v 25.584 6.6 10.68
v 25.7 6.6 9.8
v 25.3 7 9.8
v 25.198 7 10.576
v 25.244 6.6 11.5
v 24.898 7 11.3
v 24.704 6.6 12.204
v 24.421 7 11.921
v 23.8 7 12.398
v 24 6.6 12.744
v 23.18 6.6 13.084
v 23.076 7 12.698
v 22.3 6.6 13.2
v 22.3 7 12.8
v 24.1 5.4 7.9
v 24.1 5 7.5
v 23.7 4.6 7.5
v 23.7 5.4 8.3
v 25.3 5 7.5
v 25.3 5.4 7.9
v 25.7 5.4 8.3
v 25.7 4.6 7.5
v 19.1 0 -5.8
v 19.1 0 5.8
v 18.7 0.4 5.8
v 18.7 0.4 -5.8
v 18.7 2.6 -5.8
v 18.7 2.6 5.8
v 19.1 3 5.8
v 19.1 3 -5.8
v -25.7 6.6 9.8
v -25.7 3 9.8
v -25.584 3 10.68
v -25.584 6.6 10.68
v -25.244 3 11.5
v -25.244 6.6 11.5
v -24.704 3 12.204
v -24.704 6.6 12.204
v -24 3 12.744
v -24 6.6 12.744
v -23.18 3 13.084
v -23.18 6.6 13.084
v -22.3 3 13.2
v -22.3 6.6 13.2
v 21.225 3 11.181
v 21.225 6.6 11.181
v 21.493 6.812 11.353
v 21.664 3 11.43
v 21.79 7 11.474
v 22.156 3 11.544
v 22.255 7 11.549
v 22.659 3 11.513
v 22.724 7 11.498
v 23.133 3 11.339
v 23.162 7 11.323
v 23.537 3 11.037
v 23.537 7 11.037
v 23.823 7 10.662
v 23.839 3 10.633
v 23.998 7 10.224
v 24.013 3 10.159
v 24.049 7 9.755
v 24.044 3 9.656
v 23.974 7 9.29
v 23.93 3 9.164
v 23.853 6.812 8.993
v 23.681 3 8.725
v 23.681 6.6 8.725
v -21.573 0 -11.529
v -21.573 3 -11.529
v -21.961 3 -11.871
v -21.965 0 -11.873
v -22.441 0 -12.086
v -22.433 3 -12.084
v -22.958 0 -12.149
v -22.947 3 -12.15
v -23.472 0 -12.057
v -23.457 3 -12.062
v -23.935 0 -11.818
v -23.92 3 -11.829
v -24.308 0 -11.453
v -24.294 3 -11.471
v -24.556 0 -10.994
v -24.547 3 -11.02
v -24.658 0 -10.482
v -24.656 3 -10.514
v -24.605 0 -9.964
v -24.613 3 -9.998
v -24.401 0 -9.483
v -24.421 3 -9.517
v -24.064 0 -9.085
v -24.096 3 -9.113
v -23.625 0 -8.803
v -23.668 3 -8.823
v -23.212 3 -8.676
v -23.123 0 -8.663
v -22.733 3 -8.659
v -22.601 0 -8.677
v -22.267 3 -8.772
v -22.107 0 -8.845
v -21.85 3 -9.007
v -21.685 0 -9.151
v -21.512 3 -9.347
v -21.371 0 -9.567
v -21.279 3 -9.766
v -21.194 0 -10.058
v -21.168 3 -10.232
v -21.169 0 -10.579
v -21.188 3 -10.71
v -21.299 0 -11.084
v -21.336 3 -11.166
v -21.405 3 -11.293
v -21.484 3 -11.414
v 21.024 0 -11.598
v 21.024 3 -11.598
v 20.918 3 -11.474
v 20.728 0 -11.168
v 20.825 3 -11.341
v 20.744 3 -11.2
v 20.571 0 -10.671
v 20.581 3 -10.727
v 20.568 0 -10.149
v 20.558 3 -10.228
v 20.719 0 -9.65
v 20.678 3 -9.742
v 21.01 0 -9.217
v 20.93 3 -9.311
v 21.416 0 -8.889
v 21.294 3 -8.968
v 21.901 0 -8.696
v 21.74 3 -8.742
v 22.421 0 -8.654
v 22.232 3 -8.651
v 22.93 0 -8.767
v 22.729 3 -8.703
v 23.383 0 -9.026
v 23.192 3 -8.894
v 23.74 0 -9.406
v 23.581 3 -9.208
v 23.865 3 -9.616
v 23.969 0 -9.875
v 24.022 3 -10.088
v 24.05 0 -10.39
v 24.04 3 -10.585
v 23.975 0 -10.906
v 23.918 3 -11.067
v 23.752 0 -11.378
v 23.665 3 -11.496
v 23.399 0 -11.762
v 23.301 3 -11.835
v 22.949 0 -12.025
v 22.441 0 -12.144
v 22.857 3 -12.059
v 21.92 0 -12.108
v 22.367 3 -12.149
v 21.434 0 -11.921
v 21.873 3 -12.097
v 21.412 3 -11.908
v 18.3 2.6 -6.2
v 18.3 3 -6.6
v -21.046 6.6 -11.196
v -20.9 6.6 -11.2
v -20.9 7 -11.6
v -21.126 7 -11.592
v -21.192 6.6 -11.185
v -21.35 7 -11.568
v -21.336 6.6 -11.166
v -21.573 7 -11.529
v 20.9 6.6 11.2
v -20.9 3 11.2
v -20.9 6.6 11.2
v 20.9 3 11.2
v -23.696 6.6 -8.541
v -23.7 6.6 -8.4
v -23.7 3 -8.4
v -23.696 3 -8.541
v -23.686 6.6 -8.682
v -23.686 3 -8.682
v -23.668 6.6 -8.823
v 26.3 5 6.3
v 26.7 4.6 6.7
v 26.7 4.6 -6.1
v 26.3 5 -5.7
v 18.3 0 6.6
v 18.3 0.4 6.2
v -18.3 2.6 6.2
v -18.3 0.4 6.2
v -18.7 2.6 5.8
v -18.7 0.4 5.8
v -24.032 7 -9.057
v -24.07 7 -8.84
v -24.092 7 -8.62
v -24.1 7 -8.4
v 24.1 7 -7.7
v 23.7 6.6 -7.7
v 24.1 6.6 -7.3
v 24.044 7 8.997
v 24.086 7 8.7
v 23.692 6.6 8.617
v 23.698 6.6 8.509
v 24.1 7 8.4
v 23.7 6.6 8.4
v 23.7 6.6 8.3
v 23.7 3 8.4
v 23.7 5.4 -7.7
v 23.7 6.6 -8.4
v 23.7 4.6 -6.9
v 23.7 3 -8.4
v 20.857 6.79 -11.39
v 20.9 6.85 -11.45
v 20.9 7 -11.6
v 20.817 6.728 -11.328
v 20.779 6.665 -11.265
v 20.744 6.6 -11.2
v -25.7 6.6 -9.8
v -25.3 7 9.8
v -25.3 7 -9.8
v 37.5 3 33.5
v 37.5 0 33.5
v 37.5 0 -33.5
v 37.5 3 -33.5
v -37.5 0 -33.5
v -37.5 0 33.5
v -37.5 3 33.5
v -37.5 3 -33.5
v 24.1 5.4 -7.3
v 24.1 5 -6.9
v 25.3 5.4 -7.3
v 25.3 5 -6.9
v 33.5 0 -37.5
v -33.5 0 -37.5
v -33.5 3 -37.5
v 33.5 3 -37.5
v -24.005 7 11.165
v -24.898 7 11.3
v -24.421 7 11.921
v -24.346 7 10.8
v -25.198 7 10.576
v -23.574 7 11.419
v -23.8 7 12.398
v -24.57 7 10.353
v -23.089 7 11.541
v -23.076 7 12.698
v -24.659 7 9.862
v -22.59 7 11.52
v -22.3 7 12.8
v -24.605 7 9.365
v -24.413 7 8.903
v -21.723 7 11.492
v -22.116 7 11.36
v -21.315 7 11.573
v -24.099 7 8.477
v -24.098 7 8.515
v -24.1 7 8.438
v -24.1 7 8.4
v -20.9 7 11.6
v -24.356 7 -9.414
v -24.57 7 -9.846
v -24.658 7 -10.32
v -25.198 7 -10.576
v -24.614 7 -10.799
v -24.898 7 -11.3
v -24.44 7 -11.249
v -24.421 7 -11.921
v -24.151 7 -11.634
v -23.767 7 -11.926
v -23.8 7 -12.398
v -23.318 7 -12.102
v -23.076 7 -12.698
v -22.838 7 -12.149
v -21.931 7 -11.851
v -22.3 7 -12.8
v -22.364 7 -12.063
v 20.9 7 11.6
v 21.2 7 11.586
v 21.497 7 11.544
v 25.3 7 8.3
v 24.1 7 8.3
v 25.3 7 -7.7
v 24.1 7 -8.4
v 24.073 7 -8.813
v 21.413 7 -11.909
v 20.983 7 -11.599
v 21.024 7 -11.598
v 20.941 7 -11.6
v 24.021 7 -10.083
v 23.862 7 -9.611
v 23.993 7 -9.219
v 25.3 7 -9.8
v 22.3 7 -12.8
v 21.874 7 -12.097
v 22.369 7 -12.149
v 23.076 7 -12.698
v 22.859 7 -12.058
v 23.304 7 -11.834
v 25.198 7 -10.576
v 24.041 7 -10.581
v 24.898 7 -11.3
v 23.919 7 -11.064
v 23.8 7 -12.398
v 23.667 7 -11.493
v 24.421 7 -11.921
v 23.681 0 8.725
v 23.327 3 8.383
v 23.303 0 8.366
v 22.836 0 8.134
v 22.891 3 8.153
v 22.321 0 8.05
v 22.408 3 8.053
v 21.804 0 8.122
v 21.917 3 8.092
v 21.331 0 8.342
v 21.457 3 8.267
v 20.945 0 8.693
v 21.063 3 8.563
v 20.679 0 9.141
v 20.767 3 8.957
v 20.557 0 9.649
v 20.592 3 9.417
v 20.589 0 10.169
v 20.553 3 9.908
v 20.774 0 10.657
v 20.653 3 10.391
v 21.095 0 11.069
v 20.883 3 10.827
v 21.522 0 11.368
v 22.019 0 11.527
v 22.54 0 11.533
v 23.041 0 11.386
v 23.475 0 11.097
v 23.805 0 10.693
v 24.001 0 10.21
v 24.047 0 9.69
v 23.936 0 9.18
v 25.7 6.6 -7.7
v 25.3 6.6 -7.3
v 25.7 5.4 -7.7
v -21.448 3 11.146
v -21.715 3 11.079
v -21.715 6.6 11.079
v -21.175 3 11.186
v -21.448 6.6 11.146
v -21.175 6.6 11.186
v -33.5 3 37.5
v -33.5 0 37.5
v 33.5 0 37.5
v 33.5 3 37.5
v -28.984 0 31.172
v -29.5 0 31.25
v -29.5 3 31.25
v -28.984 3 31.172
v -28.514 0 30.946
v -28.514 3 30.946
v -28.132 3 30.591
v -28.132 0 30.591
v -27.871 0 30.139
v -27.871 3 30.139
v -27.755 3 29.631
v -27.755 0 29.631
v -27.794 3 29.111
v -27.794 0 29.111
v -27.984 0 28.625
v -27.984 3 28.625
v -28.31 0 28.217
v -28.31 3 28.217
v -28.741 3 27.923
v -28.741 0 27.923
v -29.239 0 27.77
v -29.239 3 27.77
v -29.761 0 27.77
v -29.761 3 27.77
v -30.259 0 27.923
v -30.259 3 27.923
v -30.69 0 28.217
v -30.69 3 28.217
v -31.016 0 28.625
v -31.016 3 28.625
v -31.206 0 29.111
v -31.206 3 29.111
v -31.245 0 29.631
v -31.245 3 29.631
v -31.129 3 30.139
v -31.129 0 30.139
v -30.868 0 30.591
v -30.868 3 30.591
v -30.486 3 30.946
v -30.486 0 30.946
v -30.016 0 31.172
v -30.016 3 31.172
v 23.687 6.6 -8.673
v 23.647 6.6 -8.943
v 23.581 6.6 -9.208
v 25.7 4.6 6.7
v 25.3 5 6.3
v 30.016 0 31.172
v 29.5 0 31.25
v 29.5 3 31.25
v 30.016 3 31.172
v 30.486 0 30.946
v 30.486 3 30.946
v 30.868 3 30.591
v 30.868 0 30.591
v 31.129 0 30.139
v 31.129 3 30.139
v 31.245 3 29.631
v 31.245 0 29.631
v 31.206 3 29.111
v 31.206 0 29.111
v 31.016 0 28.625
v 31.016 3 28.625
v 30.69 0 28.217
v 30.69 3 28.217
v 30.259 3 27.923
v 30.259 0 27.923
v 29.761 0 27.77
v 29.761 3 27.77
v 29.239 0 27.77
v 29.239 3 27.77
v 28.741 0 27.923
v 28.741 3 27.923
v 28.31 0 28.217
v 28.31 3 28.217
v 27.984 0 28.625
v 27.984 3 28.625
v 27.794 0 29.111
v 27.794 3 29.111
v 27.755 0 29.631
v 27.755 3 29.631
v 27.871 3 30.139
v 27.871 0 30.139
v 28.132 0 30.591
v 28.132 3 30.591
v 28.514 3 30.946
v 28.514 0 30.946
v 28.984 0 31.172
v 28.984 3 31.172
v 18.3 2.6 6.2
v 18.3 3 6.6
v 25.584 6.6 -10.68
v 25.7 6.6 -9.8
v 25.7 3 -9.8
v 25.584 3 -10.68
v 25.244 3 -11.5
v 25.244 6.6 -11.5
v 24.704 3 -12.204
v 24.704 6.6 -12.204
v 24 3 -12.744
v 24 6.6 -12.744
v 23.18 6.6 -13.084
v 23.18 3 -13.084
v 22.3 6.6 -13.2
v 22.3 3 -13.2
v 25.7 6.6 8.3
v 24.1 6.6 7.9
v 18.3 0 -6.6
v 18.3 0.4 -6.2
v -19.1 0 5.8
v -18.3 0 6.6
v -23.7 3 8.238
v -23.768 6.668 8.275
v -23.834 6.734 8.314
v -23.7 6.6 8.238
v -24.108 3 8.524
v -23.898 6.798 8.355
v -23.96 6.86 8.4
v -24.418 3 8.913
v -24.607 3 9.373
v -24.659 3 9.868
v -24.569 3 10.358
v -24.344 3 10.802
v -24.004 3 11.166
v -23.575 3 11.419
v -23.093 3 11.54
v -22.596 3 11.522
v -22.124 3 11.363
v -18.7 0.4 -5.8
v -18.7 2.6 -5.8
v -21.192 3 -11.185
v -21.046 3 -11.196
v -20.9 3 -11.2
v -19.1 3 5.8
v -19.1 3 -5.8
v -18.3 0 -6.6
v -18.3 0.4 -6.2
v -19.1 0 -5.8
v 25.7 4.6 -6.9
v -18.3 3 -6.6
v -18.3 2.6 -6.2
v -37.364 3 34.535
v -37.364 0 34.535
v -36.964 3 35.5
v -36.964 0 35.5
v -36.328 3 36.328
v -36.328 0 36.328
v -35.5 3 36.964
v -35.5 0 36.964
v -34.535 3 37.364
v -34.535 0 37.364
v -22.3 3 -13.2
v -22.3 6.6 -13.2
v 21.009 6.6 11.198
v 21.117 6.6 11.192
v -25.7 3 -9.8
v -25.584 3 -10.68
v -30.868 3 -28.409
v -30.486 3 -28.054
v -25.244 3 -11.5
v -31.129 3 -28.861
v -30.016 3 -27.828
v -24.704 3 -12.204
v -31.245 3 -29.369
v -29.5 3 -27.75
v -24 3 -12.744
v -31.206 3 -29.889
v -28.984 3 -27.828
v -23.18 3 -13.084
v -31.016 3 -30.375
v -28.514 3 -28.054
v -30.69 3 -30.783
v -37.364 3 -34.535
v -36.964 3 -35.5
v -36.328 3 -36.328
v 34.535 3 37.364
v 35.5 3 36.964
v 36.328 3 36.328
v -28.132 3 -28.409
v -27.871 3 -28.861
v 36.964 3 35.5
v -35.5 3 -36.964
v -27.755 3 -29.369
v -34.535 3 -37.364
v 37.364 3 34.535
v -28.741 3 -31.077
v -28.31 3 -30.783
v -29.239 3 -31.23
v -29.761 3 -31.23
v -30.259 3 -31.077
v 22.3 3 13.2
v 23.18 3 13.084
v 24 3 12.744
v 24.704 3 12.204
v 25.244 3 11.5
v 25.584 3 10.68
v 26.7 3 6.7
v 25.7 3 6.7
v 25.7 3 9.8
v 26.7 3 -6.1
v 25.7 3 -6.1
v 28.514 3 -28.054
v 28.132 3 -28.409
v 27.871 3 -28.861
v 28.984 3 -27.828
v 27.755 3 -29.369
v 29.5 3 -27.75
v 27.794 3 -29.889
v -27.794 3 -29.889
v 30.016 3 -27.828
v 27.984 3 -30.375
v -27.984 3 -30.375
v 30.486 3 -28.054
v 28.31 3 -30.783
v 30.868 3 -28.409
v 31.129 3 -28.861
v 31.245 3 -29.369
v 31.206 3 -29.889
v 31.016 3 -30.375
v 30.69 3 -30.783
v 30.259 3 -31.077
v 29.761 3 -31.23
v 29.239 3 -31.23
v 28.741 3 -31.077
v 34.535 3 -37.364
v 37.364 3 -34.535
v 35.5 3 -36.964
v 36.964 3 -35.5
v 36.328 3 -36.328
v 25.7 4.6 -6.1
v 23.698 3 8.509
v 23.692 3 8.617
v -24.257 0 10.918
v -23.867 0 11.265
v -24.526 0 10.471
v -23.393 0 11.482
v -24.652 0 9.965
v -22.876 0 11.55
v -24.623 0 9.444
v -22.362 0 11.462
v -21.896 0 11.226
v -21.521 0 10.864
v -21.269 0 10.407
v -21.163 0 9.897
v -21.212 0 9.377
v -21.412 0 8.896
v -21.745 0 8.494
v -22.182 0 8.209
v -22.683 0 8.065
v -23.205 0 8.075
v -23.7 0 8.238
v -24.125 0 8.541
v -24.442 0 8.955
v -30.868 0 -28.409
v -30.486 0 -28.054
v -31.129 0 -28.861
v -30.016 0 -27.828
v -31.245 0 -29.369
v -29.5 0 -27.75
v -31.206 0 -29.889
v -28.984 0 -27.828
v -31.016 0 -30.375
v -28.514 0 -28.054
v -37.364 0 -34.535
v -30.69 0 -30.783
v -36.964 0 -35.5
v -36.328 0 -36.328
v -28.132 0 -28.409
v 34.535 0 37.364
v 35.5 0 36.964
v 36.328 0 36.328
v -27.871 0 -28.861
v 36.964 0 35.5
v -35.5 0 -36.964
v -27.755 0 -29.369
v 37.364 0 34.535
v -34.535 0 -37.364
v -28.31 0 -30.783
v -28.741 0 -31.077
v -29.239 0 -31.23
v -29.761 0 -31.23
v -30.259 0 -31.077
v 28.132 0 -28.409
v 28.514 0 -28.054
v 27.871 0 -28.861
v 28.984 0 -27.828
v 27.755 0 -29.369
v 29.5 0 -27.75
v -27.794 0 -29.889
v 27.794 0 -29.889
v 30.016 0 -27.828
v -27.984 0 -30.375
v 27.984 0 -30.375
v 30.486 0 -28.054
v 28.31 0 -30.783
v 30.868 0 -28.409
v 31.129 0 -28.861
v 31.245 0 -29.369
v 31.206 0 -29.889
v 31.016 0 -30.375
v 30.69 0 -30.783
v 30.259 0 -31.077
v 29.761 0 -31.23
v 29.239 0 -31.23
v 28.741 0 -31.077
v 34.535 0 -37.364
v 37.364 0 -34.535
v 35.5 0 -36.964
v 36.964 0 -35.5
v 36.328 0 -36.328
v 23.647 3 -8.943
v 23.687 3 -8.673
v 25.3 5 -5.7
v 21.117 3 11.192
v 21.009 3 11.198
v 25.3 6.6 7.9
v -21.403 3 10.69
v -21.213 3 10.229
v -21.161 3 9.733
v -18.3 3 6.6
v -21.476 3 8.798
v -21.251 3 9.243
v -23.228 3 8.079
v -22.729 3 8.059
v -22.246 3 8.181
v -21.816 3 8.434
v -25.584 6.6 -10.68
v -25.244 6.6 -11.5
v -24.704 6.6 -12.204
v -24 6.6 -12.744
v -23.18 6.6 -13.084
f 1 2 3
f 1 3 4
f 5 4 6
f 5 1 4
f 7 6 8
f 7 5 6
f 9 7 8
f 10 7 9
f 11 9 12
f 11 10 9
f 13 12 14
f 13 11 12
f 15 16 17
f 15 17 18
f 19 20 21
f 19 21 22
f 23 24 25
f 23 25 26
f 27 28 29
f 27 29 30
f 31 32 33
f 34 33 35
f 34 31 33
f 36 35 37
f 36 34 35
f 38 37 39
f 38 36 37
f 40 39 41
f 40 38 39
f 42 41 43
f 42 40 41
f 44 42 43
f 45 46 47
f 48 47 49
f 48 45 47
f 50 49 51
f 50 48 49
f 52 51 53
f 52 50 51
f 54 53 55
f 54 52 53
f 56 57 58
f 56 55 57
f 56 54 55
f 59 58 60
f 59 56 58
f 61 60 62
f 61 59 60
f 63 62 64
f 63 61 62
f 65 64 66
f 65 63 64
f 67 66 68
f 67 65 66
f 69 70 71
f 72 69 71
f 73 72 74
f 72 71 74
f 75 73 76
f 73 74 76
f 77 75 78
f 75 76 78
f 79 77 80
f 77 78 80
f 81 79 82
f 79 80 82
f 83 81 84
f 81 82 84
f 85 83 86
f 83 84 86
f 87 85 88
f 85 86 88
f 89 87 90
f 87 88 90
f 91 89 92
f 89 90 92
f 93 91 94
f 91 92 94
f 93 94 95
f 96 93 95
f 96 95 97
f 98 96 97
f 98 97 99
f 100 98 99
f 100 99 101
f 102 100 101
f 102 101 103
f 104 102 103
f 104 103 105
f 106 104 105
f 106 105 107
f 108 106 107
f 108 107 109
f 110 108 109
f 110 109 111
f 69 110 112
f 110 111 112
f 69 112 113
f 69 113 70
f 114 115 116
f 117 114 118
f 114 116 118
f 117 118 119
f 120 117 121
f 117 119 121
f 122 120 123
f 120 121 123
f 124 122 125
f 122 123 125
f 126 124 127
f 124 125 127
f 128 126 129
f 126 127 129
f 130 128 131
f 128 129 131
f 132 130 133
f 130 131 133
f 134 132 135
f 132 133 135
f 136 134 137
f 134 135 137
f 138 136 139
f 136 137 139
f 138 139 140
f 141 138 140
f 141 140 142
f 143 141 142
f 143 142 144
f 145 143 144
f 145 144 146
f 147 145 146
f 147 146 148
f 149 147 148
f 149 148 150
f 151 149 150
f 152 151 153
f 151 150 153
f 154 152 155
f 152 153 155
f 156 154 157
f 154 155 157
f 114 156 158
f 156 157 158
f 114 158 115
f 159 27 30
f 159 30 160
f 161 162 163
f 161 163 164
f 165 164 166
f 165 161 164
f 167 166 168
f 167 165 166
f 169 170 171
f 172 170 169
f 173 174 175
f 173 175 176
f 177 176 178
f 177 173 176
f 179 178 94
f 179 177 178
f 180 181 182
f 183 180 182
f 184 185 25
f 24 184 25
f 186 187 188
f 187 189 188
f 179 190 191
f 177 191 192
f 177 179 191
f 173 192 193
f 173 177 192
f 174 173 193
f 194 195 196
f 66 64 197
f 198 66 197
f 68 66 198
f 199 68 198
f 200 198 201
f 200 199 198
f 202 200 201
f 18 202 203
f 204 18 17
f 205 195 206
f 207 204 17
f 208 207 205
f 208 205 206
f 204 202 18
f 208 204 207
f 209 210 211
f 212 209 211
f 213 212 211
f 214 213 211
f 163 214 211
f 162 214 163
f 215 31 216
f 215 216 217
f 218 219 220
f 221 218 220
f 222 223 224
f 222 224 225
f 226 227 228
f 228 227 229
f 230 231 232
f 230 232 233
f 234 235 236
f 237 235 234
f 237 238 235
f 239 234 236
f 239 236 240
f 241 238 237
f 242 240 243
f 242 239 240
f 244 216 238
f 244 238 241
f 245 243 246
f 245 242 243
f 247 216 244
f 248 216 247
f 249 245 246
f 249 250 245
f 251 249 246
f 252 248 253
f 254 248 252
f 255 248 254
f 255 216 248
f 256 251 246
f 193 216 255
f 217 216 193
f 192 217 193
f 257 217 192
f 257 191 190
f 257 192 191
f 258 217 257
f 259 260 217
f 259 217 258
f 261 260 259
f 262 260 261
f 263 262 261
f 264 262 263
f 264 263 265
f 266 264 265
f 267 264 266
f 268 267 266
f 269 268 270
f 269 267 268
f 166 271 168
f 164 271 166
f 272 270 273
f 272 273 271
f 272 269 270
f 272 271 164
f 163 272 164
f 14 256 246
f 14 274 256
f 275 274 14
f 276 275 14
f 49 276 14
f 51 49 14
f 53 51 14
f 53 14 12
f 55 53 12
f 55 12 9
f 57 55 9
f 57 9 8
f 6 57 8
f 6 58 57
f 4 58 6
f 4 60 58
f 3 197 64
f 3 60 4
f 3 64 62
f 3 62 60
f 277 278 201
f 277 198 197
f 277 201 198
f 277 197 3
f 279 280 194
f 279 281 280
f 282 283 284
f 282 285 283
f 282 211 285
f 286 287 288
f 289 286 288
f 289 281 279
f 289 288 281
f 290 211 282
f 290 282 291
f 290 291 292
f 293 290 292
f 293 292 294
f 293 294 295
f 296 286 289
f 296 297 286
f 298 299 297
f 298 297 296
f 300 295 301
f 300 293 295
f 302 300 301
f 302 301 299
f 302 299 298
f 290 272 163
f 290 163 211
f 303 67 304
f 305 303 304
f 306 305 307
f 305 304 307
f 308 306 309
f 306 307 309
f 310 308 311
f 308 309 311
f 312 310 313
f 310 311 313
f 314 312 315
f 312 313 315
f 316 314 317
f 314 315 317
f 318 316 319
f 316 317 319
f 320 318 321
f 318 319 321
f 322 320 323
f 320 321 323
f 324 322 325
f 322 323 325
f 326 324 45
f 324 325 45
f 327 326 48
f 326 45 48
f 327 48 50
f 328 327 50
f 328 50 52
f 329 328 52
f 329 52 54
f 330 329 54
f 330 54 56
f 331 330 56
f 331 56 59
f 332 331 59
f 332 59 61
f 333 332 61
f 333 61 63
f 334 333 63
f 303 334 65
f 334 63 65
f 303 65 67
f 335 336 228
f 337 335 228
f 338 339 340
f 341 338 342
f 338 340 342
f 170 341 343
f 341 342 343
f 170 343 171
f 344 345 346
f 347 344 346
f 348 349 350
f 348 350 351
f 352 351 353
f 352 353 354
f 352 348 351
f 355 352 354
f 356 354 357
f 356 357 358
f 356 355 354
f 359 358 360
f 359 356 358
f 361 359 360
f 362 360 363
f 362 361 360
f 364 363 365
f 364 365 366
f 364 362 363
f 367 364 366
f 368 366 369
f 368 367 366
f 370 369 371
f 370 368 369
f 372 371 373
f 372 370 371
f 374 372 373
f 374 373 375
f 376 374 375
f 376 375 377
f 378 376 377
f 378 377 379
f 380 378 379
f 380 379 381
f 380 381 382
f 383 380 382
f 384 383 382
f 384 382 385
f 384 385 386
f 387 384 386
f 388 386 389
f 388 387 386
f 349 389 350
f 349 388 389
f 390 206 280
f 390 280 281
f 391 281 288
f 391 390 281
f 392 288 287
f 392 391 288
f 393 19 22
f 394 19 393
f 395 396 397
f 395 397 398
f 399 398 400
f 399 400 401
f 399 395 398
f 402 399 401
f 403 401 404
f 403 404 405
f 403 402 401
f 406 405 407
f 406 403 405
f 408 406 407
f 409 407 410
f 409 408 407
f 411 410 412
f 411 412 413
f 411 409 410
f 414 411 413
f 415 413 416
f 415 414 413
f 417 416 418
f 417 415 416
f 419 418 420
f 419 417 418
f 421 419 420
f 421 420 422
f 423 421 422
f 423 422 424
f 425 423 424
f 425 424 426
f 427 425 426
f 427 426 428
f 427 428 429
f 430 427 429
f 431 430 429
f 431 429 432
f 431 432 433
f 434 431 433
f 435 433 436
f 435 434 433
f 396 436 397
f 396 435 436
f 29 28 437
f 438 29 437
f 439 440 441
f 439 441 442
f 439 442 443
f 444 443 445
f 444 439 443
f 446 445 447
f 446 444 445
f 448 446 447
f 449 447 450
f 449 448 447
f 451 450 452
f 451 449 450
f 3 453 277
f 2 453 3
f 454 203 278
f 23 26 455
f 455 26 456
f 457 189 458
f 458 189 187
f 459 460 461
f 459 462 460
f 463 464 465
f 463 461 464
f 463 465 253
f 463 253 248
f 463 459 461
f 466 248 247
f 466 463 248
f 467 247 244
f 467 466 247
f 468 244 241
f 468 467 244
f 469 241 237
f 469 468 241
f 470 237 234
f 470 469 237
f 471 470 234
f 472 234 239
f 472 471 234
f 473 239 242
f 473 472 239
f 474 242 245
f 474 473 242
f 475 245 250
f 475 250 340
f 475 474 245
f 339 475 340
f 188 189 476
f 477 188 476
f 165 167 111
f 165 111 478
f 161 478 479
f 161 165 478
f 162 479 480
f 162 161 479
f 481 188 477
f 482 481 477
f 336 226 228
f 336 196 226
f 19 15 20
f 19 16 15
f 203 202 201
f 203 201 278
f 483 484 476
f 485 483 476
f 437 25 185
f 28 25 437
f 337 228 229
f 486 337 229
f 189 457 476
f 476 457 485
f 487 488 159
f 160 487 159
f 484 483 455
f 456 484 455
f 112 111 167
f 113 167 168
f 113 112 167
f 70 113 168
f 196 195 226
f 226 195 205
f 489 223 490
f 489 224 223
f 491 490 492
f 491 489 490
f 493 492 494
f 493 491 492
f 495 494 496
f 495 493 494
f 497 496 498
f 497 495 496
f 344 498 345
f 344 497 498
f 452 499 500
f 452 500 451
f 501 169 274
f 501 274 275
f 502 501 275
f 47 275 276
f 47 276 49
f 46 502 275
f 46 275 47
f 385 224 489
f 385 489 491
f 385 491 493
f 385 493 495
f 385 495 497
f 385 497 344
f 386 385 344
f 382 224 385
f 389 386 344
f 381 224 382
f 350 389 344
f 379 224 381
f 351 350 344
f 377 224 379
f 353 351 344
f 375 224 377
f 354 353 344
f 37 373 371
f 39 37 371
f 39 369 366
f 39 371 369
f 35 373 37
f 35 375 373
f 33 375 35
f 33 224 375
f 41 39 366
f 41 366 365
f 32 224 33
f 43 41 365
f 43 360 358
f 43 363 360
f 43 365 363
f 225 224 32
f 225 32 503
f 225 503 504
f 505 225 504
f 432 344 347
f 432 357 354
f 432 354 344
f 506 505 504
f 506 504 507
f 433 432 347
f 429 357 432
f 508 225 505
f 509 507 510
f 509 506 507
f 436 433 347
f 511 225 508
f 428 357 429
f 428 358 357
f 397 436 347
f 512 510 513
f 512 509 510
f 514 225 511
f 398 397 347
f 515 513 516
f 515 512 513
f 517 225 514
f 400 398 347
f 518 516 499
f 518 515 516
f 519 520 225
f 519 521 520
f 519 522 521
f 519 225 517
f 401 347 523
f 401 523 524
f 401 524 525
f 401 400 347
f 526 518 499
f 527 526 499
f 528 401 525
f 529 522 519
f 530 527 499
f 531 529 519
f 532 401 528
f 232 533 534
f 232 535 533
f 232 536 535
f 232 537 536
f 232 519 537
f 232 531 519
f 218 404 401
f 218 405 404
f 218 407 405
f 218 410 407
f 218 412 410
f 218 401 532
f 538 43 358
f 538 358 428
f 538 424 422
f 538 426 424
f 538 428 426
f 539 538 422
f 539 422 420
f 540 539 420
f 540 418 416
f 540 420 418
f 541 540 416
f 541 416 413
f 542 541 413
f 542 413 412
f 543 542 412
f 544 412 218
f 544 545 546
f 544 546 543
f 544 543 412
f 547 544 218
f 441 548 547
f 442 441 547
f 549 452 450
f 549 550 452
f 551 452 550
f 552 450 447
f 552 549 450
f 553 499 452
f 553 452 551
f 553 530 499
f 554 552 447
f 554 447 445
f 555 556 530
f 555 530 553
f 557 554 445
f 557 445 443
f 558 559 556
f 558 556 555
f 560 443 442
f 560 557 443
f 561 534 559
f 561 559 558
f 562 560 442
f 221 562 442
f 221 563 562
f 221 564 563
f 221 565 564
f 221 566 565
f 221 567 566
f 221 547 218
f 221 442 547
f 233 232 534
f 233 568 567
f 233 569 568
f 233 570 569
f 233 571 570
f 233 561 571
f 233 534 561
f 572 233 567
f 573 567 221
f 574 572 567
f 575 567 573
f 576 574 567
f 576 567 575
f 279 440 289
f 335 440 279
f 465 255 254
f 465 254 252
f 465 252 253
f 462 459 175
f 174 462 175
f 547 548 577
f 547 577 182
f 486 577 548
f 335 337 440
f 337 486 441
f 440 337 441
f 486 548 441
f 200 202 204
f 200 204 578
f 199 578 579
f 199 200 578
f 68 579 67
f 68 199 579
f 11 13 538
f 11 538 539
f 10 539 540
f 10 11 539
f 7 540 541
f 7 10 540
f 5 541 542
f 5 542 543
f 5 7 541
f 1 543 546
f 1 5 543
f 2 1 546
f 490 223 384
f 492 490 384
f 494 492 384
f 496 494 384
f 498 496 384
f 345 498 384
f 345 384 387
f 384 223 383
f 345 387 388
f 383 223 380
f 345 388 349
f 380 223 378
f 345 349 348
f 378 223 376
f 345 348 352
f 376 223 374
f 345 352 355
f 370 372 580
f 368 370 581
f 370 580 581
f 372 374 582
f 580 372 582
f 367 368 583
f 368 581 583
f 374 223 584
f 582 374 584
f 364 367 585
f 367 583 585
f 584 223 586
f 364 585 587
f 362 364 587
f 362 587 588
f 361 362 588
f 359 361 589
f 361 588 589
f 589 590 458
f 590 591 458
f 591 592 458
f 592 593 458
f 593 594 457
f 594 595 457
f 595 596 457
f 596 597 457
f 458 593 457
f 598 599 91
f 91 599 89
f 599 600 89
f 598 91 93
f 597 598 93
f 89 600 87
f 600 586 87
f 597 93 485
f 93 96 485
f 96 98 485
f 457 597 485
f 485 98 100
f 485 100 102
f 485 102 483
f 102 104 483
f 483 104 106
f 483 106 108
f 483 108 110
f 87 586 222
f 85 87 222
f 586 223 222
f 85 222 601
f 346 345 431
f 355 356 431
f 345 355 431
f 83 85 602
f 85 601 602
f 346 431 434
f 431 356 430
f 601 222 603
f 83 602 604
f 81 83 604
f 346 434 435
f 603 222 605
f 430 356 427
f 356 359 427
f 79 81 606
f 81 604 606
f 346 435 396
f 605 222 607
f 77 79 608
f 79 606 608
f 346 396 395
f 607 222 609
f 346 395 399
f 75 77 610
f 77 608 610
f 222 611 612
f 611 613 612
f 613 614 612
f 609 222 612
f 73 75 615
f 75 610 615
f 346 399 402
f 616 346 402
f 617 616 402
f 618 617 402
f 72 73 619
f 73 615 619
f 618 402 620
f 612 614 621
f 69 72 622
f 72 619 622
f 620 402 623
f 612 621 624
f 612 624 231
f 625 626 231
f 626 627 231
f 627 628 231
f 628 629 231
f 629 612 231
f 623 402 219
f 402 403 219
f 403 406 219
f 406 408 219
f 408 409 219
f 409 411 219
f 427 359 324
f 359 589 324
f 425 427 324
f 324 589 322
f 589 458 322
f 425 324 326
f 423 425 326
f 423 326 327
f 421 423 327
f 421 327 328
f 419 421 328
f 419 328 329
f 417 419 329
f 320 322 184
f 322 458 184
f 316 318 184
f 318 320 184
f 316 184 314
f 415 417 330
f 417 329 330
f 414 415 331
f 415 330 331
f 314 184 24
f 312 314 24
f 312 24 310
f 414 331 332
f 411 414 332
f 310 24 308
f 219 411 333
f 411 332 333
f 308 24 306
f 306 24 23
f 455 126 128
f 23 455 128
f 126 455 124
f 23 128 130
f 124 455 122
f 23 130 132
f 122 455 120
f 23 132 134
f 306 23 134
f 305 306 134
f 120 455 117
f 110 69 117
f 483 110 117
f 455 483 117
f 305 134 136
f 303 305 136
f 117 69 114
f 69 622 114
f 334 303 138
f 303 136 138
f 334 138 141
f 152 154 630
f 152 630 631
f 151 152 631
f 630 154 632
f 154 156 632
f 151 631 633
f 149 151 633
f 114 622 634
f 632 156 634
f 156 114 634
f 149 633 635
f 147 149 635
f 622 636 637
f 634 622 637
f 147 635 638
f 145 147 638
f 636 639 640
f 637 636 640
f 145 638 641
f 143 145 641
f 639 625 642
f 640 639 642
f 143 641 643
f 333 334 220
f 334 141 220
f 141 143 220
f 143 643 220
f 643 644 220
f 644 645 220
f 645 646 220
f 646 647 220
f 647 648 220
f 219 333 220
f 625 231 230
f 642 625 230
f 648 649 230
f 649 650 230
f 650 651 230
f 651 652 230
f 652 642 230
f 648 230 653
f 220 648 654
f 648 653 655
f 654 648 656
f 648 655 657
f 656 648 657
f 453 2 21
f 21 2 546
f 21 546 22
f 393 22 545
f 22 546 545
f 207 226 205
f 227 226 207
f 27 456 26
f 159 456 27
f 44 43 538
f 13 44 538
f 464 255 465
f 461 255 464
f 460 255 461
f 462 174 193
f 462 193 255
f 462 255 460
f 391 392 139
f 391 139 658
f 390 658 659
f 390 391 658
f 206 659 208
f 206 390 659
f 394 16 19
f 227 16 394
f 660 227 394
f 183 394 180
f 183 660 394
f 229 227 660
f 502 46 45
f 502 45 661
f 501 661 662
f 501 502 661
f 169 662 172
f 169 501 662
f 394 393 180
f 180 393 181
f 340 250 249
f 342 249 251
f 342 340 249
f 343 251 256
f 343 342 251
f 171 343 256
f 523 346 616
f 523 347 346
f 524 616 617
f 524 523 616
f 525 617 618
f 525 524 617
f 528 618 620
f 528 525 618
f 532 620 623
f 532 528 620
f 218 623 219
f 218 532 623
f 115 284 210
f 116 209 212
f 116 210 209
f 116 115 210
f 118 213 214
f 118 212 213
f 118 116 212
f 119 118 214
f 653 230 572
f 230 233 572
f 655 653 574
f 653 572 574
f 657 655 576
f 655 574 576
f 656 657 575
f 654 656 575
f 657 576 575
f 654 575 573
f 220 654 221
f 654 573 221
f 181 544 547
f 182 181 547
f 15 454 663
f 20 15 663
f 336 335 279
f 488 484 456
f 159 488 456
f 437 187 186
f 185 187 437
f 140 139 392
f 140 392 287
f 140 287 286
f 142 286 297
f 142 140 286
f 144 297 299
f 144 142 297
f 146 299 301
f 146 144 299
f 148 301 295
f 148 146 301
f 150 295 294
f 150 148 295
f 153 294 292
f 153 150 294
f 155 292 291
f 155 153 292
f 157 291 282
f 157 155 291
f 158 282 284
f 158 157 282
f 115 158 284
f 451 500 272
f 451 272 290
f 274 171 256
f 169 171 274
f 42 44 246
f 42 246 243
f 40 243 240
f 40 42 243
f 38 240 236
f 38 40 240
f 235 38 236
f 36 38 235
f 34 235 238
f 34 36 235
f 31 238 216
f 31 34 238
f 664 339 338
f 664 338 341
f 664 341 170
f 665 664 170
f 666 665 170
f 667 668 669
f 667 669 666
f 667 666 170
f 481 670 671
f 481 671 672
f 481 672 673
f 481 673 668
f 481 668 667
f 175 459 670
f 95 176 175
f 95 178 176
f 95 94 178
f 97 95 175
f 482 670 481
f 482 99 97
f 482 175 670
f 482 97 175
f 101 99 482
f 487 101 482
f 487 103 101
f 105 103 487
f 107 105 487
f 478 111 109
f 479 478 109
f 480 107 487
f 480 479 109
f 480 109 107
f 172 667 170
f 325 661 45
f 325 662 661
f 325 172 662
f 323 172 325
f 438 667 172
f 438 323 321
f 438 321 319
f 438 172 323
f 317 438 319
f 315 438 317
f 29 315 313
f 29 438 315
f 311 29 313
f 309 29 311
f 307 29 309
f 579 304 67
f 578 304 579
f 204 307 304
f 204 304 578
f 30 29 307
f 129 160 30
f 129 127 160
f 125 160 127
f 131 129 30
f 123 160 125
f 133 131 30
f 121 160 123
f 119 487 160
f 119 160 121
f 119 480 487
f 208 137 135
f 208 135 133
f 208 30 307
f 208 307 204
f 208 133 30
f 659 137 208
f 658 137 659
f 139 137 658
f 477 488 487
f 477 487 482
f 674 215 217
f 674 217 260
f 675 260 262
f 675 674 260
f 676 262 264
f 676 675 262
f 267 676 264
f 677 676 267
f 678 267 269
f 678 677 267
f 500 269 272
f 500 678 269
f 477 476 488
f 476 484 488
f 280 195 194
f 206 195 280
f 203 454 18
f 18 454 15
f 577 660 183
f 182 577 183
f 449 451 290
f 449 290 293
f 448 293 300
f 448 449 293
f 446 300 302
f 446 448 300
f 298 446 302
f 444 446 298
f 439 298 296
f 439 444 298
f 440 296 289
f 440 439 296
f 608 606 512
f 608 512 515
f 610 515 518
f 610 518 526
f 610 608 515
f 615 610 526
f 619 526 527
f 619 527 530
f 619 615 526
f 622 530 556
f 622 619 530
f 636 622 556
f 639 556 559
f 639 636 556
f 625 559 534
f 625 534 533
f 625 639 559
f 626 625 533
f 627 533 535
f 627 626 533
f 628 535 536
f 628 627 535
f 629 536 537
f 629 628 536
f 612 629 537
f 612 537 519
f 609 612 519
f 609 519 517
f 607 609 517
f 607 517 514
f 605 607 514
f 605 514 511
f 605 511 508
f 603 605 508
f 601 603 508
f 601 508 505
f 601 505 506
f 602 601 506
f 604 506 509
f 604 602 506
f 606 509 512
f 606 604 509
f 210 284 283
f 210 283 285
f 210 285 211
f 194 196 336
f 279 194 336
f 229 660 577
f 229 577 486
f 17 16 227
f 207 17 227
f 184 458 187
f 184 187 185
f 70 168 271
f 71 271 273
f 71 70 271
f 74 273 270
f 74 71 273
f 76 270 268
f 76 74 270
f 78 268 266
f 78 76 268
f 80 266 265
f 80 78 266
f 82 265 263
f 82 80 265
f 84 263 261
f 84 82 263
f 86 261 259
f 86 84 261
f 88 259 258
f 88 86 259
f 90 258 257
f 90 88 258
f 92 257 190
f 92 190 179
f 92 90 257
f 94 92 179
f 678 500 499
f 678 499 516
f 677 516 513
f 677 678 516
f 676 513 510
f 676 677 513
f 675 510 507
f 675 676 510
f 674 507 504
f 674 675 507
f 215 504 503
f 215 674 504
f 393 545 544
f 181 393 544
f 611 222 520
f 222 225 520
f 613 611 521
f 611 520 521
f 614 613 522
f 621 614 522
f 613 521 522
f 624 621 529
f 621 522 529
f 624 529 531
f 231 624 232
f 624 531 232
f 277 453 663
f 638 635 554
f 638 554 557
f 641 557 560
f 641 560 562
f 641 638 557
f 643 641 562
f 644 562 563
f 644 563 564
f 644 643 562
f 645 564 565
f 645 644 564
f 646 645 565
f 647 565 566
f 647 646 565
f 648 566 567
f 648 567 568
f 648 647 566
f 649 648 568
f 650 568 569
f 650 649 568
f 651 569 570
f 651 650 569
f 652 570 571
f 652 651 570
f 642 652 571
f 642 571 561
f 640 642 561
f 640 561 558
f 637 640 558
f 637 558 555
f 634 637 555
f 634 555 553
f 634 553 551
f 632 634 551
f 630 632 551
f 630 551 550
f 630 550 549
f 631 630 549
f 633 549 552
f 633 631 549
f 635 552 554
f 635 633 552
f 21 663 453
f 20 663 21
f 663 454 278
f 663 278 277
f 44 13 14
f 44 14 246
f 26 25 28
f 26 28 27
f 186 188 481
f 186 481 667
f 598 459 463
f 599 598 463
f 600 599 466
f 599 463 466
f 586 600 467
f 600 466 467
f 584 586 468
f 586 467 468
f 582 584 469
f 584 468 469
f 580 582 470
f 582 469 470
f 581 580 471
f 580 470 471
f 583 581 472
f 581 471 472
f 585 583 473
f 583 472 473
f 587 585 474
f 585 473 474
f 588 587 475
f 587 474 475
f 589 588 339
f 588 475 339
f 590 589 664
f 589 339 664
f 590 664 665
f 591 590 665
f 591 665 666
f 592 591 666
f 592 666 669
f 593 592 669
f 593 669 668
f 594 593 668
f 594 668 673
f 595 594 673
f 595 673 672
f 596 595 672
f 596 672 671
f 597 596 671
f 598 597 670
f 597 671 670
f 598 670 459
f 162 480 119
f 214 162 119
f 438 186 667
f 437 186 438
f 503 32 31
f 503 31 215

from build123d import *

# Parameters (mm, degrees)
SKETCH_1_W                      = 75
SKETCH_1_H                      = 75
SKETCH_1_R                      = 1.75
SKETCH_1_W_2                    = 37.4
SKETCH_1_H_2                    = 12.4
EXTRUDE_1_DEPTH                 = 3
SKETCH_2_W                      = 51.4
SKETCH_2_H                      = 26.4
SKETCH_2_W_2                    = 47.4
SKETCH_2_H_2                    = 22.4
EXTRUDE_2_DEPTH                 = 4
SKETCH_3_W                      = 2
SKETCH_3_H                      = 15.2
CUT_EXTRUDE_1_DEPTH             = 2
SKETCH_4_W                      = 1
SKETCH_4_H                      = 12.8
EXTRUDE_3_DEPTH                 = 2
FILLET_1_R                      = 2.8
FILLET_2_R                      = 3.4
CHAMFER_1_SIZE                  = 0.4
CUT_EXTRUDE_2_REACH             = 55.184
SKETCH_5_R                      = 1.75
CUT_EXTRUDE_2_DIRECTION_2_DEPTH = 54.183644102
FILLET_3_R                      = 4


with BuildPart() as part:
    # 草图1 → 凸台-拉伸1 (new body)
    with BuildSketch(Plane(origin=(0, 0, 0), x_dir=(1, 0, 0), z_dir=(0, 1, 0))):
        Rectangle(SKETCH_1_W, SKETCH_1_H)
        with Locations(Location((-29.5, 29.5, 0), (0, 0, 270))):
            Circle(SKETCH_1_R, mode=Mode.SUBTRACT)
        with Locations(Location((29.5, 29.5, 0), (0, 0, 270))):
            Circle(SKETCH_1_R, mode=Mode.SUBTRACT)
        with Locations(Location((29.5, -29.5, 0), (0, 0, 270))):
            Circle(SKETCH_1_R, mode=Mode.SUBTRACT)
        with Locations(Location((-29.5, -29.5, 0), (0, 0, 270))):
            Circle(SKETCH_1_R, mode=Mode.SUBTRACT)
        Rectangle(SKETCH_1_W_2, SKETCH_1_H_2, mode=Mode.SUBTRACT)
    extrude(amount=EXTRUDE_1_DEPTH)

    # 草图2 → 凸台-拉伸2 (add)
    with BuildSketch(Plane(origin=(0, 3, 0), x_dir=(1, 0, 0), z_dir=(0, 1, 0))):
        Rectangle(SKETCH_2_W, SKETCH_2_H)
        Rectangle(SKETCH_2_W_2, SKETCH_2_H_2, mode=Mode.SUBTRACT)
    extrude(amount=EXTRUDE_2_DEPTH)

    # 草图3 → 切除-拉伸1 (cut)
    with BuildSketch(Plane(origin=(0, 7, 0), x_dir=(1, 0, 0), z_dir=(0, 1, 0))):
        with Locations((24.7, -0.3)):
            Rectangle(SKETCH_3_W, SKETCH_3_H)
    extrude(amount=-CUT_EXTRUDE_1_DEPTH, mode=Mode.SUBTRACT)

    # 草图4 → 凸台-拉伸3 (add)
    with BuildSketch(Plane(origin=(0, 3, 0), x_dir=(1, 0, 0), z_dir=(0, 1, 0))):
        with Locations((26.2, -0.3)):
            Rectangle(SKETCH_4_W, SKETCH_4_H)
    extrude(amount=EXTRUDE_3_DEPTH)

    # 圆角1
    fillet_1_edges = [part.edges().sort_by_distance(p)[0] for p in [
        (23.7, 5, -11.2),
        (-23.7, 5, -11.2),
        (-23.7, 5, 11.2),
        (23.7, 5, 11.2),
    ]]
    fillet(fillet_1_edges, radius=FILLET_1_R)

    # 圆角2
    fillet_2_edges = [part.edges().sort_by_distance(p)[0] for p in [
        (25.7, 5, 13.2),
        (25.7, 5, -13.2),
        (-25.7, 5, -13.2),
        (-25.7, 5, 13.2),
    ]]
    fillet(fillet_2_edges, radius=FILLET_2_R)

    # 倒角1
    chamfer_1_edges = [part.edges().sort_by_distance(p)[0] for p in [
        (0, 7, 11.2),
        (23.7, 7, 8.15),
        (-23.7, 7, 0),
        (0, 7, -11.2),
        (22.879898987, 7, 10.379898987),
        (-22.879898987, 7, 10.379898987),
        (22.879898987, 7, -10.379898987),
        (-22.879898987, 7, -10.379898987),
        (0, 7, -13.2),
        (-25.7, 7, 0),
        (0, 7, 13.2),
        (25.7, 7, 8.85),
        (-24.704163056, 7, -12.204163056),
        (-24.704163056, 7, 12.204163056),
        (24.704163056, 7, 12.204163056),
        (24.704163056, 7, -12.204163056),
        (18.7, 0, 0),
        (18.7, 1.5, 6.2),
        (0, 0, -6.2),
        (18.7, 1.5, -6.2),
        (-18.7, 0, 0),
        (-18.7, 1.5, -6.2),
        (0, 0, 6.2),
        (-18.7, 1.5, 6.2),
        (18.7, 3, 0),
        (0, 3, -6.2),
        (-18.7, 3, 0),
        (0, 3, 6.2),
        (23.7, 7, -7.85),
        (25.7, 7, -8.55),
        (23.7, 5, 0.3),
        (23.7, 6, 7.9),
        (24.7, 5, -7.3),
        (23.7, 6, -7.3),
        (25.7, 5, 7.3),
        (25.7, 6, -7.3),
        (24.7, 5, 7.9),
        (25.7, 6, 7.9),
        (24.7, 7, 7.9),
        (24.7, 7, -7.3),
        (25.7, 5, -6.7),
        (26.2, 5, 6.7),
        (26.7, 5, 0.3),
        (26.2, 5, -6.1),
    ]]
    chamfer(chamfer_1_edges, length=CHAMFER_1_SIZE)

    # 草图5 → 切除-拉伸2 (cut, up to next)
    with BuildSketch(Plane(origin=(0, 3, 0), x_dir=(1, 0, 0), z_dir=(0, 1, 0)), mode=Mode.PRIVATE) as cut_extrude_2_sk1:
        with Locations(Location((-22.91, 10.4, 0), (0, 0, 40.156544446))):
            Circle(SKETCH_5_R)
    cut_extrude_2_tool1 = extrude(cut_extrude_2_sk1.sketch, amount=-CUT_EXTRUDE_2_REACH, mode=Mode.PRIVATE) & part.part
    # 草图5 → 切除-拉伸2 (cut, up to next)
    with BuildSketch(Plane(origin=(0, 3, 0), x_dir=(1, 0, 0), z_dir=(0, 1, 0)), mode=Mode.PRIVATE) as cut_extrude_2_sk2:
        with Locations(Location((22.3, 10.4, 0), (0, 0, 136.81614849))):
            Circle(SKETCH_5_R)
    cut_extrude_2_tool2 = extrude(cut_extrude_2_sk2.sketch, amount=-CUT_EXTRUDE_2_REACH, mode=Mode.PRIVATE) & part.part
    # 草图5 → 切除-拉伸2 (cut, up to next)
    with BuildSketch(Plane(origin=(0, 3, 0), x_dir=(1, 0, 0), z_dir=(0, 1, 0)), mode=Mode.PRIVATE) as cut_extrude_2_sk3:
        with Locations(Location((22.3, -9.8, 0), (0, 0, 37.891788933))):
            Circle(SKETCH_5_R)
    cut_extrude_2_tool3 = extrude(cut_extrude_2_sk3.sketch, amount=-CUT_EXTRUDE_2_REACH, mode=Mode.PRIVATE) & part.part
    # 草图5 → 切除-拉伸2 (cut, up to next)
    with BuildSketch(Plane(origin=(0, 3, 0), x_dir=(1, 0, 0), z_dir=(0, 1, 0)), mode=Mode.PRIVATE) as cut_extrude_2_sk4:
        with Locations(Location((-22.91, -9.8, 0), (0, 0, 116.835376612))):
            Circle(SKETCH_5_R)
    cut_extrude_2_tool4 = extrude(cut_extrude_2_sk4.sketch, amount=-CUT_EXTRUDE_2_REACH, mode=Mode.PRIVATE) & part.part
    add(cut_extrude_2_tool1.solids().sort_by_distance((-22.91, 3, -10.4))[0], mode=Mode.SUBTRACT)
    add(cut_extrude_2_tool2.solids().sort_by_distance((22.3, 3, -10.4))[0], mode=Mode.SUBTRACT)
    add(cut_extrude_2_tool3.solids().sort_by_distance((22.3, 3, 9.8))[0], mode=Mode.SUBTRACT)
    add(cut_extrude_2_tool4.solids().sort_by_distance((-22.91, 3, 9.8))[0], mode=Mode.SUBTRACT)

    # 草图5 → 切除-拉伸2 direction 2 (cut)
    with BuildSketch(Plane(origin=(0, 3, 0), x_dir=(1, 0, 0), z_dir=(0, 1, 0))):
        with Locations(Location((-22.91, 10.4, 0), (0, 0, 40.156544446))):
            Circle(SKETCH_5_R)
        with Locations(Location((22.3, 10.4, 0), (0, 0, 136.81614849))):
            Circle(SKETCH_5_R)
        with Locations(Location((22.3, -9.8, 0), (0, 0, 37.891788933))):
            Circle(SKETCH_5_R)
        with Locations(Location((-22.91, -9.8, 0), (0, 0, 116.835376612))):
            Circle(SKETCH_5_R)
    extrude(amount=CUT_EXTRUDE_2_DIRECTION_2_DEPTH, mode=Mode.SUBTRACT)

    # 圆角3
    fillet_3_edges = [part.edges().sort_by_distance(p)[0] for p in [
        (37.5, 1.5, 37.5),
        (-37.5, 1.5, 37.5),
        (-37.5, 1.5, -37.5),
        (37.5, 1.5, -37.5),
    ]]
    fillet(fillet_3_edges, radius=FILLET_3_R)


solid = part.part
